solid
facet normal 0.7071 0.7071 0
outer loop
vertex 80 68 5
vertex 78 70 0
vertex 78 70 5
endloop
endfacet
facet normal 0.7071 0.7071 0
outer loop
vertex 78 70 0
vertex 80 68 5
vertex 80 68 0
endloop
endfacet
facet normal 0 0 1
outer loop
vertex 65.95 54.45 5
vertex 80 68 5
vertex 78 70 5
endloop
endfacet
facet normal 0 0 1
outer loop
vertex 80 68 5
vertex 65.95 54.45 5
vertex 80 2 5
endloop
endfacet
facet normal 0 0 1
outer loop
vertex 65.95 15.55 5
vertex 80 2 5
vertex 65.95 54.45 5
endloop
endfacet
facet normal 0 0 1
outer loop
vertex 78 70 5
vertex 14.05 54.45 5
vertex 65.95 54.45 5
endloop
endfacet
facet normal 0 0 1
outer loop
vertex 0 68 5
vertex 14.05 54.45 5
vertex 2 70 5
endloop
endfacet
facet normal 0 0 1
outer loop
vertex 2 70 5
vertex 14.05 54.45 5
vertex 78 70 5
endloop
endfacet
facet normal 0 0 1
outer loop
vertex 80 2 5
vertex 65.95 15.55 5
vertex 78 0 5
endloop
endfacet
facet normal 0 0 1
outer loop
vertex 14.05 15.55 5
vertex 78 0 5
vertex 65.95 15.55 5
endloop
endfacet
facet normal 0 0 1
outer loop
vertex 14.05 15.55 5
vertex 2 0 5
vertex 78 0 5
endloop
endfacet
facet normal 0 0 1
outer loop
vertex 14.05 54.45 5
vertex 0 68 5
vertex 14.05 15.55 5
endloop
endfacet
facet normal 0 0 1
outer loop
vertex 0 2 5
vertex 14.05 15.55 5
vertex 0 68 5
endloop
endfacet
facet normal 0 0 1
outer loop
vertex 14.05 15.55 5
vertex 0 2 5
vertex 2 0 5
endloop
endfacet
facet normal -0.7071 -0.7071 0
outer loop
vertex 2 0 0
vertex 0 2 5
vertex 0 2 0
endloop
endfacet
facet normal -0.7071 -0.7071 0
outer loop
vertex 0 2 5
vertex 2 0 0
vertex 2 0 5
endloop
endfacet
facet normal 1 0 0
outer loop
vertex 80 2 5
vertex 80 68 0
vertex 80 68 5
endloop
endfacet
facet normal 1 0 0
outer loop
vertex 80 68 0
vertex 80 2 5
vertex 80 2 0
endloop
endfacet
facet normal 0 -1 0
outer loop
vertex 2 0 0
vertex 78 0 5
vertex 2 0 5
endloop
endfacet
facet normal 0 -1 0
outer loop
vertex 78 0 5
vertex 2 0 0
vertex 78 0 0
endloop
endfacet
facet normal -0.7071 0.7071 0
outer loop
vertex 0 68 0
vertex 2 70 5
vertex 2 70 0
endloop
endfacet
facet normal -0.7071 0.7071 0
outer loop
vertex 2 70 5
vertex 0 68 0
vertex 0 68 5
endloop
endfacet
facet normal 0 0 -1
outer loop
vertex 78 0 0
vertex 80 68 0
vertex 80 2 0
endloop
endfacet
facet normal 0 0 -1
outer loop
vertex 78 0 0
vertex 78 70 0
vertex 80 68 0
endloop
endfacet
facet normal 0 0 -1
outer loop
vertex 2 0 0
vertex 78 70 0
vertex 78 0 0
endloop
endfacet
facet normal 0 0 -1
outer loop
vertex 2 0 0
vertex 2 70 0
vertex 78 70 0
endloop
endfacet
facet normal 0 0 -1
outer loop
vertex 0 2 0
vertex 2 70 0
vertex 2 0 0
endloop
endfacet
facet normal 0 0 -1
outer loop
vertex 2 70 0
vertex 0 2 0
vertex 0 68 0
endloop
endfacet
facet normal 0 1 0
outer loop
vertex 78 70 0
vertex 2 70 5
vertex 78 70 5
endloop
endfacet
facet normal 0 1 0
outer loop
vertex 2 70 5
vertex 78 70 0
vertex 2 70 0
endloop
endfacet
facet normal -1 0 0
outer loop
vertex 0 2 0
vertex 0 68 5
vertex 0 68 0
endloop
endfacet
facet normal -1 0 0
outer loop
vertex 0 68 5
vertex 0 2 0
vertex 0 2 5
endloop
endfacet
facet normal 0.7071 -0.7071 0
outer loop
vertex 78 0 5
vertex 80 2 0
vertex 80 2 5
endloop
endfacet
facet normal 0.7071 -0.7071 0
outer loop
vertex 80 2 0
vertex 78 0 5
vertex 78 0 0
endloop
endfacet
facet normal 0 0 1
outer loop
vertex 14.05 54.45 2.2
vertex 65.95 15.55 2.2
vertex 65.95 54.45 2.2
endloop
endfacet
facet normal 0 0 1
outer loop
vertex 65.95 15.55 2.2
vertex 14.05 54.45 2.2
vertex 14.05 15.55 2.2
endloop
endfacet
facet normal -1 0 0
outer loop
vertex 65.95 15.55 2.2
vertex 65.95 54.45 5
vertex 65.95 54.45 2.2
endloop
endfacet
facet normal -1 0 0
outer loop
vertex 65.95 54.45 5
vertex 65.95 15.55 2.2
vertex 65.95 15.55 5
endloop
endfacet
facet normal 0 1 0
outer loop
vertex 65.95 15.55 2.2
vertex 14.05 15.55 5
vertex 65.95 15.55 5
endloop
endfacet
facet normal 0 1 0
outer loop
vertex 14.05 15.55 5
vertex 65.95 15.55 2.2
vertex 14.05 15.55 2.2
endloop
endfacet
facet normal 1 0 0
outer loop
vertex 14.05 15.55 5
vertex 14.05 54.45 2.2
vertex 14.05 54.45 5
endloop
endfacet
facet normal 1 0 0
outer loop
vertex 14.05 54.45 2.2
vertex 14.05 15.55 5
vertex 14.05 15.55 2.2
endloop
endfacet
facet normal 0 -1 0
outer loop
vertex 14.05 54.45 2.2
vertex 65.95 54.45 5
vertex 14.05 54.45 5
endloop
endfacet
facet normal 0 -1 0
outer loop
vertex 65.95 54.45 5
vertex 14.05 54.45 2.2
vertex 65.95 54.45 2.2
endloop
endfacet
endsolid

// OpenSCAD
$fn = 32;

// ----------------------------------------------------------------------
// Windowed plate: 1 voids, 80 x 70 x 5 mm
// ----------------------------------------------------------------------

// --- parameters (mm) ---
plate_l = 80;             // plate length, X
plate_w = 70;             // plate width, Y
plate_t = 5;              // plate thickness, Z
edge_margin = 10;         // wall from the plate edge to any window
win1_l = 51.9;            // window length
win1_w = 38.9;            // window width
depth_1 = 2.8;            // depth of void 1 (full thickness = through)
corner_c = 2;             // corner chamfer of the plate

profile = [[2, 0], [78, 0], [80, 2], [80, 68], [78, 70], [2, 70], [0, 68], [0, 2]];  // primary outline, 8 points, counter clockwise
void_1 = [[14.05, 15.55], [65.95, 15.55], [65.95, 54.45], [14.05, 54.45]];  // large central window, 4 points

// --- the one profile operation ---
difference() {
  linear_extrude(height = plate_t) polygon(points = profile);
  translate([0, 0, plate_t - depth_1])
    linear_extrude(height = depth_1 + 1) polygon(points = void_1);
}
